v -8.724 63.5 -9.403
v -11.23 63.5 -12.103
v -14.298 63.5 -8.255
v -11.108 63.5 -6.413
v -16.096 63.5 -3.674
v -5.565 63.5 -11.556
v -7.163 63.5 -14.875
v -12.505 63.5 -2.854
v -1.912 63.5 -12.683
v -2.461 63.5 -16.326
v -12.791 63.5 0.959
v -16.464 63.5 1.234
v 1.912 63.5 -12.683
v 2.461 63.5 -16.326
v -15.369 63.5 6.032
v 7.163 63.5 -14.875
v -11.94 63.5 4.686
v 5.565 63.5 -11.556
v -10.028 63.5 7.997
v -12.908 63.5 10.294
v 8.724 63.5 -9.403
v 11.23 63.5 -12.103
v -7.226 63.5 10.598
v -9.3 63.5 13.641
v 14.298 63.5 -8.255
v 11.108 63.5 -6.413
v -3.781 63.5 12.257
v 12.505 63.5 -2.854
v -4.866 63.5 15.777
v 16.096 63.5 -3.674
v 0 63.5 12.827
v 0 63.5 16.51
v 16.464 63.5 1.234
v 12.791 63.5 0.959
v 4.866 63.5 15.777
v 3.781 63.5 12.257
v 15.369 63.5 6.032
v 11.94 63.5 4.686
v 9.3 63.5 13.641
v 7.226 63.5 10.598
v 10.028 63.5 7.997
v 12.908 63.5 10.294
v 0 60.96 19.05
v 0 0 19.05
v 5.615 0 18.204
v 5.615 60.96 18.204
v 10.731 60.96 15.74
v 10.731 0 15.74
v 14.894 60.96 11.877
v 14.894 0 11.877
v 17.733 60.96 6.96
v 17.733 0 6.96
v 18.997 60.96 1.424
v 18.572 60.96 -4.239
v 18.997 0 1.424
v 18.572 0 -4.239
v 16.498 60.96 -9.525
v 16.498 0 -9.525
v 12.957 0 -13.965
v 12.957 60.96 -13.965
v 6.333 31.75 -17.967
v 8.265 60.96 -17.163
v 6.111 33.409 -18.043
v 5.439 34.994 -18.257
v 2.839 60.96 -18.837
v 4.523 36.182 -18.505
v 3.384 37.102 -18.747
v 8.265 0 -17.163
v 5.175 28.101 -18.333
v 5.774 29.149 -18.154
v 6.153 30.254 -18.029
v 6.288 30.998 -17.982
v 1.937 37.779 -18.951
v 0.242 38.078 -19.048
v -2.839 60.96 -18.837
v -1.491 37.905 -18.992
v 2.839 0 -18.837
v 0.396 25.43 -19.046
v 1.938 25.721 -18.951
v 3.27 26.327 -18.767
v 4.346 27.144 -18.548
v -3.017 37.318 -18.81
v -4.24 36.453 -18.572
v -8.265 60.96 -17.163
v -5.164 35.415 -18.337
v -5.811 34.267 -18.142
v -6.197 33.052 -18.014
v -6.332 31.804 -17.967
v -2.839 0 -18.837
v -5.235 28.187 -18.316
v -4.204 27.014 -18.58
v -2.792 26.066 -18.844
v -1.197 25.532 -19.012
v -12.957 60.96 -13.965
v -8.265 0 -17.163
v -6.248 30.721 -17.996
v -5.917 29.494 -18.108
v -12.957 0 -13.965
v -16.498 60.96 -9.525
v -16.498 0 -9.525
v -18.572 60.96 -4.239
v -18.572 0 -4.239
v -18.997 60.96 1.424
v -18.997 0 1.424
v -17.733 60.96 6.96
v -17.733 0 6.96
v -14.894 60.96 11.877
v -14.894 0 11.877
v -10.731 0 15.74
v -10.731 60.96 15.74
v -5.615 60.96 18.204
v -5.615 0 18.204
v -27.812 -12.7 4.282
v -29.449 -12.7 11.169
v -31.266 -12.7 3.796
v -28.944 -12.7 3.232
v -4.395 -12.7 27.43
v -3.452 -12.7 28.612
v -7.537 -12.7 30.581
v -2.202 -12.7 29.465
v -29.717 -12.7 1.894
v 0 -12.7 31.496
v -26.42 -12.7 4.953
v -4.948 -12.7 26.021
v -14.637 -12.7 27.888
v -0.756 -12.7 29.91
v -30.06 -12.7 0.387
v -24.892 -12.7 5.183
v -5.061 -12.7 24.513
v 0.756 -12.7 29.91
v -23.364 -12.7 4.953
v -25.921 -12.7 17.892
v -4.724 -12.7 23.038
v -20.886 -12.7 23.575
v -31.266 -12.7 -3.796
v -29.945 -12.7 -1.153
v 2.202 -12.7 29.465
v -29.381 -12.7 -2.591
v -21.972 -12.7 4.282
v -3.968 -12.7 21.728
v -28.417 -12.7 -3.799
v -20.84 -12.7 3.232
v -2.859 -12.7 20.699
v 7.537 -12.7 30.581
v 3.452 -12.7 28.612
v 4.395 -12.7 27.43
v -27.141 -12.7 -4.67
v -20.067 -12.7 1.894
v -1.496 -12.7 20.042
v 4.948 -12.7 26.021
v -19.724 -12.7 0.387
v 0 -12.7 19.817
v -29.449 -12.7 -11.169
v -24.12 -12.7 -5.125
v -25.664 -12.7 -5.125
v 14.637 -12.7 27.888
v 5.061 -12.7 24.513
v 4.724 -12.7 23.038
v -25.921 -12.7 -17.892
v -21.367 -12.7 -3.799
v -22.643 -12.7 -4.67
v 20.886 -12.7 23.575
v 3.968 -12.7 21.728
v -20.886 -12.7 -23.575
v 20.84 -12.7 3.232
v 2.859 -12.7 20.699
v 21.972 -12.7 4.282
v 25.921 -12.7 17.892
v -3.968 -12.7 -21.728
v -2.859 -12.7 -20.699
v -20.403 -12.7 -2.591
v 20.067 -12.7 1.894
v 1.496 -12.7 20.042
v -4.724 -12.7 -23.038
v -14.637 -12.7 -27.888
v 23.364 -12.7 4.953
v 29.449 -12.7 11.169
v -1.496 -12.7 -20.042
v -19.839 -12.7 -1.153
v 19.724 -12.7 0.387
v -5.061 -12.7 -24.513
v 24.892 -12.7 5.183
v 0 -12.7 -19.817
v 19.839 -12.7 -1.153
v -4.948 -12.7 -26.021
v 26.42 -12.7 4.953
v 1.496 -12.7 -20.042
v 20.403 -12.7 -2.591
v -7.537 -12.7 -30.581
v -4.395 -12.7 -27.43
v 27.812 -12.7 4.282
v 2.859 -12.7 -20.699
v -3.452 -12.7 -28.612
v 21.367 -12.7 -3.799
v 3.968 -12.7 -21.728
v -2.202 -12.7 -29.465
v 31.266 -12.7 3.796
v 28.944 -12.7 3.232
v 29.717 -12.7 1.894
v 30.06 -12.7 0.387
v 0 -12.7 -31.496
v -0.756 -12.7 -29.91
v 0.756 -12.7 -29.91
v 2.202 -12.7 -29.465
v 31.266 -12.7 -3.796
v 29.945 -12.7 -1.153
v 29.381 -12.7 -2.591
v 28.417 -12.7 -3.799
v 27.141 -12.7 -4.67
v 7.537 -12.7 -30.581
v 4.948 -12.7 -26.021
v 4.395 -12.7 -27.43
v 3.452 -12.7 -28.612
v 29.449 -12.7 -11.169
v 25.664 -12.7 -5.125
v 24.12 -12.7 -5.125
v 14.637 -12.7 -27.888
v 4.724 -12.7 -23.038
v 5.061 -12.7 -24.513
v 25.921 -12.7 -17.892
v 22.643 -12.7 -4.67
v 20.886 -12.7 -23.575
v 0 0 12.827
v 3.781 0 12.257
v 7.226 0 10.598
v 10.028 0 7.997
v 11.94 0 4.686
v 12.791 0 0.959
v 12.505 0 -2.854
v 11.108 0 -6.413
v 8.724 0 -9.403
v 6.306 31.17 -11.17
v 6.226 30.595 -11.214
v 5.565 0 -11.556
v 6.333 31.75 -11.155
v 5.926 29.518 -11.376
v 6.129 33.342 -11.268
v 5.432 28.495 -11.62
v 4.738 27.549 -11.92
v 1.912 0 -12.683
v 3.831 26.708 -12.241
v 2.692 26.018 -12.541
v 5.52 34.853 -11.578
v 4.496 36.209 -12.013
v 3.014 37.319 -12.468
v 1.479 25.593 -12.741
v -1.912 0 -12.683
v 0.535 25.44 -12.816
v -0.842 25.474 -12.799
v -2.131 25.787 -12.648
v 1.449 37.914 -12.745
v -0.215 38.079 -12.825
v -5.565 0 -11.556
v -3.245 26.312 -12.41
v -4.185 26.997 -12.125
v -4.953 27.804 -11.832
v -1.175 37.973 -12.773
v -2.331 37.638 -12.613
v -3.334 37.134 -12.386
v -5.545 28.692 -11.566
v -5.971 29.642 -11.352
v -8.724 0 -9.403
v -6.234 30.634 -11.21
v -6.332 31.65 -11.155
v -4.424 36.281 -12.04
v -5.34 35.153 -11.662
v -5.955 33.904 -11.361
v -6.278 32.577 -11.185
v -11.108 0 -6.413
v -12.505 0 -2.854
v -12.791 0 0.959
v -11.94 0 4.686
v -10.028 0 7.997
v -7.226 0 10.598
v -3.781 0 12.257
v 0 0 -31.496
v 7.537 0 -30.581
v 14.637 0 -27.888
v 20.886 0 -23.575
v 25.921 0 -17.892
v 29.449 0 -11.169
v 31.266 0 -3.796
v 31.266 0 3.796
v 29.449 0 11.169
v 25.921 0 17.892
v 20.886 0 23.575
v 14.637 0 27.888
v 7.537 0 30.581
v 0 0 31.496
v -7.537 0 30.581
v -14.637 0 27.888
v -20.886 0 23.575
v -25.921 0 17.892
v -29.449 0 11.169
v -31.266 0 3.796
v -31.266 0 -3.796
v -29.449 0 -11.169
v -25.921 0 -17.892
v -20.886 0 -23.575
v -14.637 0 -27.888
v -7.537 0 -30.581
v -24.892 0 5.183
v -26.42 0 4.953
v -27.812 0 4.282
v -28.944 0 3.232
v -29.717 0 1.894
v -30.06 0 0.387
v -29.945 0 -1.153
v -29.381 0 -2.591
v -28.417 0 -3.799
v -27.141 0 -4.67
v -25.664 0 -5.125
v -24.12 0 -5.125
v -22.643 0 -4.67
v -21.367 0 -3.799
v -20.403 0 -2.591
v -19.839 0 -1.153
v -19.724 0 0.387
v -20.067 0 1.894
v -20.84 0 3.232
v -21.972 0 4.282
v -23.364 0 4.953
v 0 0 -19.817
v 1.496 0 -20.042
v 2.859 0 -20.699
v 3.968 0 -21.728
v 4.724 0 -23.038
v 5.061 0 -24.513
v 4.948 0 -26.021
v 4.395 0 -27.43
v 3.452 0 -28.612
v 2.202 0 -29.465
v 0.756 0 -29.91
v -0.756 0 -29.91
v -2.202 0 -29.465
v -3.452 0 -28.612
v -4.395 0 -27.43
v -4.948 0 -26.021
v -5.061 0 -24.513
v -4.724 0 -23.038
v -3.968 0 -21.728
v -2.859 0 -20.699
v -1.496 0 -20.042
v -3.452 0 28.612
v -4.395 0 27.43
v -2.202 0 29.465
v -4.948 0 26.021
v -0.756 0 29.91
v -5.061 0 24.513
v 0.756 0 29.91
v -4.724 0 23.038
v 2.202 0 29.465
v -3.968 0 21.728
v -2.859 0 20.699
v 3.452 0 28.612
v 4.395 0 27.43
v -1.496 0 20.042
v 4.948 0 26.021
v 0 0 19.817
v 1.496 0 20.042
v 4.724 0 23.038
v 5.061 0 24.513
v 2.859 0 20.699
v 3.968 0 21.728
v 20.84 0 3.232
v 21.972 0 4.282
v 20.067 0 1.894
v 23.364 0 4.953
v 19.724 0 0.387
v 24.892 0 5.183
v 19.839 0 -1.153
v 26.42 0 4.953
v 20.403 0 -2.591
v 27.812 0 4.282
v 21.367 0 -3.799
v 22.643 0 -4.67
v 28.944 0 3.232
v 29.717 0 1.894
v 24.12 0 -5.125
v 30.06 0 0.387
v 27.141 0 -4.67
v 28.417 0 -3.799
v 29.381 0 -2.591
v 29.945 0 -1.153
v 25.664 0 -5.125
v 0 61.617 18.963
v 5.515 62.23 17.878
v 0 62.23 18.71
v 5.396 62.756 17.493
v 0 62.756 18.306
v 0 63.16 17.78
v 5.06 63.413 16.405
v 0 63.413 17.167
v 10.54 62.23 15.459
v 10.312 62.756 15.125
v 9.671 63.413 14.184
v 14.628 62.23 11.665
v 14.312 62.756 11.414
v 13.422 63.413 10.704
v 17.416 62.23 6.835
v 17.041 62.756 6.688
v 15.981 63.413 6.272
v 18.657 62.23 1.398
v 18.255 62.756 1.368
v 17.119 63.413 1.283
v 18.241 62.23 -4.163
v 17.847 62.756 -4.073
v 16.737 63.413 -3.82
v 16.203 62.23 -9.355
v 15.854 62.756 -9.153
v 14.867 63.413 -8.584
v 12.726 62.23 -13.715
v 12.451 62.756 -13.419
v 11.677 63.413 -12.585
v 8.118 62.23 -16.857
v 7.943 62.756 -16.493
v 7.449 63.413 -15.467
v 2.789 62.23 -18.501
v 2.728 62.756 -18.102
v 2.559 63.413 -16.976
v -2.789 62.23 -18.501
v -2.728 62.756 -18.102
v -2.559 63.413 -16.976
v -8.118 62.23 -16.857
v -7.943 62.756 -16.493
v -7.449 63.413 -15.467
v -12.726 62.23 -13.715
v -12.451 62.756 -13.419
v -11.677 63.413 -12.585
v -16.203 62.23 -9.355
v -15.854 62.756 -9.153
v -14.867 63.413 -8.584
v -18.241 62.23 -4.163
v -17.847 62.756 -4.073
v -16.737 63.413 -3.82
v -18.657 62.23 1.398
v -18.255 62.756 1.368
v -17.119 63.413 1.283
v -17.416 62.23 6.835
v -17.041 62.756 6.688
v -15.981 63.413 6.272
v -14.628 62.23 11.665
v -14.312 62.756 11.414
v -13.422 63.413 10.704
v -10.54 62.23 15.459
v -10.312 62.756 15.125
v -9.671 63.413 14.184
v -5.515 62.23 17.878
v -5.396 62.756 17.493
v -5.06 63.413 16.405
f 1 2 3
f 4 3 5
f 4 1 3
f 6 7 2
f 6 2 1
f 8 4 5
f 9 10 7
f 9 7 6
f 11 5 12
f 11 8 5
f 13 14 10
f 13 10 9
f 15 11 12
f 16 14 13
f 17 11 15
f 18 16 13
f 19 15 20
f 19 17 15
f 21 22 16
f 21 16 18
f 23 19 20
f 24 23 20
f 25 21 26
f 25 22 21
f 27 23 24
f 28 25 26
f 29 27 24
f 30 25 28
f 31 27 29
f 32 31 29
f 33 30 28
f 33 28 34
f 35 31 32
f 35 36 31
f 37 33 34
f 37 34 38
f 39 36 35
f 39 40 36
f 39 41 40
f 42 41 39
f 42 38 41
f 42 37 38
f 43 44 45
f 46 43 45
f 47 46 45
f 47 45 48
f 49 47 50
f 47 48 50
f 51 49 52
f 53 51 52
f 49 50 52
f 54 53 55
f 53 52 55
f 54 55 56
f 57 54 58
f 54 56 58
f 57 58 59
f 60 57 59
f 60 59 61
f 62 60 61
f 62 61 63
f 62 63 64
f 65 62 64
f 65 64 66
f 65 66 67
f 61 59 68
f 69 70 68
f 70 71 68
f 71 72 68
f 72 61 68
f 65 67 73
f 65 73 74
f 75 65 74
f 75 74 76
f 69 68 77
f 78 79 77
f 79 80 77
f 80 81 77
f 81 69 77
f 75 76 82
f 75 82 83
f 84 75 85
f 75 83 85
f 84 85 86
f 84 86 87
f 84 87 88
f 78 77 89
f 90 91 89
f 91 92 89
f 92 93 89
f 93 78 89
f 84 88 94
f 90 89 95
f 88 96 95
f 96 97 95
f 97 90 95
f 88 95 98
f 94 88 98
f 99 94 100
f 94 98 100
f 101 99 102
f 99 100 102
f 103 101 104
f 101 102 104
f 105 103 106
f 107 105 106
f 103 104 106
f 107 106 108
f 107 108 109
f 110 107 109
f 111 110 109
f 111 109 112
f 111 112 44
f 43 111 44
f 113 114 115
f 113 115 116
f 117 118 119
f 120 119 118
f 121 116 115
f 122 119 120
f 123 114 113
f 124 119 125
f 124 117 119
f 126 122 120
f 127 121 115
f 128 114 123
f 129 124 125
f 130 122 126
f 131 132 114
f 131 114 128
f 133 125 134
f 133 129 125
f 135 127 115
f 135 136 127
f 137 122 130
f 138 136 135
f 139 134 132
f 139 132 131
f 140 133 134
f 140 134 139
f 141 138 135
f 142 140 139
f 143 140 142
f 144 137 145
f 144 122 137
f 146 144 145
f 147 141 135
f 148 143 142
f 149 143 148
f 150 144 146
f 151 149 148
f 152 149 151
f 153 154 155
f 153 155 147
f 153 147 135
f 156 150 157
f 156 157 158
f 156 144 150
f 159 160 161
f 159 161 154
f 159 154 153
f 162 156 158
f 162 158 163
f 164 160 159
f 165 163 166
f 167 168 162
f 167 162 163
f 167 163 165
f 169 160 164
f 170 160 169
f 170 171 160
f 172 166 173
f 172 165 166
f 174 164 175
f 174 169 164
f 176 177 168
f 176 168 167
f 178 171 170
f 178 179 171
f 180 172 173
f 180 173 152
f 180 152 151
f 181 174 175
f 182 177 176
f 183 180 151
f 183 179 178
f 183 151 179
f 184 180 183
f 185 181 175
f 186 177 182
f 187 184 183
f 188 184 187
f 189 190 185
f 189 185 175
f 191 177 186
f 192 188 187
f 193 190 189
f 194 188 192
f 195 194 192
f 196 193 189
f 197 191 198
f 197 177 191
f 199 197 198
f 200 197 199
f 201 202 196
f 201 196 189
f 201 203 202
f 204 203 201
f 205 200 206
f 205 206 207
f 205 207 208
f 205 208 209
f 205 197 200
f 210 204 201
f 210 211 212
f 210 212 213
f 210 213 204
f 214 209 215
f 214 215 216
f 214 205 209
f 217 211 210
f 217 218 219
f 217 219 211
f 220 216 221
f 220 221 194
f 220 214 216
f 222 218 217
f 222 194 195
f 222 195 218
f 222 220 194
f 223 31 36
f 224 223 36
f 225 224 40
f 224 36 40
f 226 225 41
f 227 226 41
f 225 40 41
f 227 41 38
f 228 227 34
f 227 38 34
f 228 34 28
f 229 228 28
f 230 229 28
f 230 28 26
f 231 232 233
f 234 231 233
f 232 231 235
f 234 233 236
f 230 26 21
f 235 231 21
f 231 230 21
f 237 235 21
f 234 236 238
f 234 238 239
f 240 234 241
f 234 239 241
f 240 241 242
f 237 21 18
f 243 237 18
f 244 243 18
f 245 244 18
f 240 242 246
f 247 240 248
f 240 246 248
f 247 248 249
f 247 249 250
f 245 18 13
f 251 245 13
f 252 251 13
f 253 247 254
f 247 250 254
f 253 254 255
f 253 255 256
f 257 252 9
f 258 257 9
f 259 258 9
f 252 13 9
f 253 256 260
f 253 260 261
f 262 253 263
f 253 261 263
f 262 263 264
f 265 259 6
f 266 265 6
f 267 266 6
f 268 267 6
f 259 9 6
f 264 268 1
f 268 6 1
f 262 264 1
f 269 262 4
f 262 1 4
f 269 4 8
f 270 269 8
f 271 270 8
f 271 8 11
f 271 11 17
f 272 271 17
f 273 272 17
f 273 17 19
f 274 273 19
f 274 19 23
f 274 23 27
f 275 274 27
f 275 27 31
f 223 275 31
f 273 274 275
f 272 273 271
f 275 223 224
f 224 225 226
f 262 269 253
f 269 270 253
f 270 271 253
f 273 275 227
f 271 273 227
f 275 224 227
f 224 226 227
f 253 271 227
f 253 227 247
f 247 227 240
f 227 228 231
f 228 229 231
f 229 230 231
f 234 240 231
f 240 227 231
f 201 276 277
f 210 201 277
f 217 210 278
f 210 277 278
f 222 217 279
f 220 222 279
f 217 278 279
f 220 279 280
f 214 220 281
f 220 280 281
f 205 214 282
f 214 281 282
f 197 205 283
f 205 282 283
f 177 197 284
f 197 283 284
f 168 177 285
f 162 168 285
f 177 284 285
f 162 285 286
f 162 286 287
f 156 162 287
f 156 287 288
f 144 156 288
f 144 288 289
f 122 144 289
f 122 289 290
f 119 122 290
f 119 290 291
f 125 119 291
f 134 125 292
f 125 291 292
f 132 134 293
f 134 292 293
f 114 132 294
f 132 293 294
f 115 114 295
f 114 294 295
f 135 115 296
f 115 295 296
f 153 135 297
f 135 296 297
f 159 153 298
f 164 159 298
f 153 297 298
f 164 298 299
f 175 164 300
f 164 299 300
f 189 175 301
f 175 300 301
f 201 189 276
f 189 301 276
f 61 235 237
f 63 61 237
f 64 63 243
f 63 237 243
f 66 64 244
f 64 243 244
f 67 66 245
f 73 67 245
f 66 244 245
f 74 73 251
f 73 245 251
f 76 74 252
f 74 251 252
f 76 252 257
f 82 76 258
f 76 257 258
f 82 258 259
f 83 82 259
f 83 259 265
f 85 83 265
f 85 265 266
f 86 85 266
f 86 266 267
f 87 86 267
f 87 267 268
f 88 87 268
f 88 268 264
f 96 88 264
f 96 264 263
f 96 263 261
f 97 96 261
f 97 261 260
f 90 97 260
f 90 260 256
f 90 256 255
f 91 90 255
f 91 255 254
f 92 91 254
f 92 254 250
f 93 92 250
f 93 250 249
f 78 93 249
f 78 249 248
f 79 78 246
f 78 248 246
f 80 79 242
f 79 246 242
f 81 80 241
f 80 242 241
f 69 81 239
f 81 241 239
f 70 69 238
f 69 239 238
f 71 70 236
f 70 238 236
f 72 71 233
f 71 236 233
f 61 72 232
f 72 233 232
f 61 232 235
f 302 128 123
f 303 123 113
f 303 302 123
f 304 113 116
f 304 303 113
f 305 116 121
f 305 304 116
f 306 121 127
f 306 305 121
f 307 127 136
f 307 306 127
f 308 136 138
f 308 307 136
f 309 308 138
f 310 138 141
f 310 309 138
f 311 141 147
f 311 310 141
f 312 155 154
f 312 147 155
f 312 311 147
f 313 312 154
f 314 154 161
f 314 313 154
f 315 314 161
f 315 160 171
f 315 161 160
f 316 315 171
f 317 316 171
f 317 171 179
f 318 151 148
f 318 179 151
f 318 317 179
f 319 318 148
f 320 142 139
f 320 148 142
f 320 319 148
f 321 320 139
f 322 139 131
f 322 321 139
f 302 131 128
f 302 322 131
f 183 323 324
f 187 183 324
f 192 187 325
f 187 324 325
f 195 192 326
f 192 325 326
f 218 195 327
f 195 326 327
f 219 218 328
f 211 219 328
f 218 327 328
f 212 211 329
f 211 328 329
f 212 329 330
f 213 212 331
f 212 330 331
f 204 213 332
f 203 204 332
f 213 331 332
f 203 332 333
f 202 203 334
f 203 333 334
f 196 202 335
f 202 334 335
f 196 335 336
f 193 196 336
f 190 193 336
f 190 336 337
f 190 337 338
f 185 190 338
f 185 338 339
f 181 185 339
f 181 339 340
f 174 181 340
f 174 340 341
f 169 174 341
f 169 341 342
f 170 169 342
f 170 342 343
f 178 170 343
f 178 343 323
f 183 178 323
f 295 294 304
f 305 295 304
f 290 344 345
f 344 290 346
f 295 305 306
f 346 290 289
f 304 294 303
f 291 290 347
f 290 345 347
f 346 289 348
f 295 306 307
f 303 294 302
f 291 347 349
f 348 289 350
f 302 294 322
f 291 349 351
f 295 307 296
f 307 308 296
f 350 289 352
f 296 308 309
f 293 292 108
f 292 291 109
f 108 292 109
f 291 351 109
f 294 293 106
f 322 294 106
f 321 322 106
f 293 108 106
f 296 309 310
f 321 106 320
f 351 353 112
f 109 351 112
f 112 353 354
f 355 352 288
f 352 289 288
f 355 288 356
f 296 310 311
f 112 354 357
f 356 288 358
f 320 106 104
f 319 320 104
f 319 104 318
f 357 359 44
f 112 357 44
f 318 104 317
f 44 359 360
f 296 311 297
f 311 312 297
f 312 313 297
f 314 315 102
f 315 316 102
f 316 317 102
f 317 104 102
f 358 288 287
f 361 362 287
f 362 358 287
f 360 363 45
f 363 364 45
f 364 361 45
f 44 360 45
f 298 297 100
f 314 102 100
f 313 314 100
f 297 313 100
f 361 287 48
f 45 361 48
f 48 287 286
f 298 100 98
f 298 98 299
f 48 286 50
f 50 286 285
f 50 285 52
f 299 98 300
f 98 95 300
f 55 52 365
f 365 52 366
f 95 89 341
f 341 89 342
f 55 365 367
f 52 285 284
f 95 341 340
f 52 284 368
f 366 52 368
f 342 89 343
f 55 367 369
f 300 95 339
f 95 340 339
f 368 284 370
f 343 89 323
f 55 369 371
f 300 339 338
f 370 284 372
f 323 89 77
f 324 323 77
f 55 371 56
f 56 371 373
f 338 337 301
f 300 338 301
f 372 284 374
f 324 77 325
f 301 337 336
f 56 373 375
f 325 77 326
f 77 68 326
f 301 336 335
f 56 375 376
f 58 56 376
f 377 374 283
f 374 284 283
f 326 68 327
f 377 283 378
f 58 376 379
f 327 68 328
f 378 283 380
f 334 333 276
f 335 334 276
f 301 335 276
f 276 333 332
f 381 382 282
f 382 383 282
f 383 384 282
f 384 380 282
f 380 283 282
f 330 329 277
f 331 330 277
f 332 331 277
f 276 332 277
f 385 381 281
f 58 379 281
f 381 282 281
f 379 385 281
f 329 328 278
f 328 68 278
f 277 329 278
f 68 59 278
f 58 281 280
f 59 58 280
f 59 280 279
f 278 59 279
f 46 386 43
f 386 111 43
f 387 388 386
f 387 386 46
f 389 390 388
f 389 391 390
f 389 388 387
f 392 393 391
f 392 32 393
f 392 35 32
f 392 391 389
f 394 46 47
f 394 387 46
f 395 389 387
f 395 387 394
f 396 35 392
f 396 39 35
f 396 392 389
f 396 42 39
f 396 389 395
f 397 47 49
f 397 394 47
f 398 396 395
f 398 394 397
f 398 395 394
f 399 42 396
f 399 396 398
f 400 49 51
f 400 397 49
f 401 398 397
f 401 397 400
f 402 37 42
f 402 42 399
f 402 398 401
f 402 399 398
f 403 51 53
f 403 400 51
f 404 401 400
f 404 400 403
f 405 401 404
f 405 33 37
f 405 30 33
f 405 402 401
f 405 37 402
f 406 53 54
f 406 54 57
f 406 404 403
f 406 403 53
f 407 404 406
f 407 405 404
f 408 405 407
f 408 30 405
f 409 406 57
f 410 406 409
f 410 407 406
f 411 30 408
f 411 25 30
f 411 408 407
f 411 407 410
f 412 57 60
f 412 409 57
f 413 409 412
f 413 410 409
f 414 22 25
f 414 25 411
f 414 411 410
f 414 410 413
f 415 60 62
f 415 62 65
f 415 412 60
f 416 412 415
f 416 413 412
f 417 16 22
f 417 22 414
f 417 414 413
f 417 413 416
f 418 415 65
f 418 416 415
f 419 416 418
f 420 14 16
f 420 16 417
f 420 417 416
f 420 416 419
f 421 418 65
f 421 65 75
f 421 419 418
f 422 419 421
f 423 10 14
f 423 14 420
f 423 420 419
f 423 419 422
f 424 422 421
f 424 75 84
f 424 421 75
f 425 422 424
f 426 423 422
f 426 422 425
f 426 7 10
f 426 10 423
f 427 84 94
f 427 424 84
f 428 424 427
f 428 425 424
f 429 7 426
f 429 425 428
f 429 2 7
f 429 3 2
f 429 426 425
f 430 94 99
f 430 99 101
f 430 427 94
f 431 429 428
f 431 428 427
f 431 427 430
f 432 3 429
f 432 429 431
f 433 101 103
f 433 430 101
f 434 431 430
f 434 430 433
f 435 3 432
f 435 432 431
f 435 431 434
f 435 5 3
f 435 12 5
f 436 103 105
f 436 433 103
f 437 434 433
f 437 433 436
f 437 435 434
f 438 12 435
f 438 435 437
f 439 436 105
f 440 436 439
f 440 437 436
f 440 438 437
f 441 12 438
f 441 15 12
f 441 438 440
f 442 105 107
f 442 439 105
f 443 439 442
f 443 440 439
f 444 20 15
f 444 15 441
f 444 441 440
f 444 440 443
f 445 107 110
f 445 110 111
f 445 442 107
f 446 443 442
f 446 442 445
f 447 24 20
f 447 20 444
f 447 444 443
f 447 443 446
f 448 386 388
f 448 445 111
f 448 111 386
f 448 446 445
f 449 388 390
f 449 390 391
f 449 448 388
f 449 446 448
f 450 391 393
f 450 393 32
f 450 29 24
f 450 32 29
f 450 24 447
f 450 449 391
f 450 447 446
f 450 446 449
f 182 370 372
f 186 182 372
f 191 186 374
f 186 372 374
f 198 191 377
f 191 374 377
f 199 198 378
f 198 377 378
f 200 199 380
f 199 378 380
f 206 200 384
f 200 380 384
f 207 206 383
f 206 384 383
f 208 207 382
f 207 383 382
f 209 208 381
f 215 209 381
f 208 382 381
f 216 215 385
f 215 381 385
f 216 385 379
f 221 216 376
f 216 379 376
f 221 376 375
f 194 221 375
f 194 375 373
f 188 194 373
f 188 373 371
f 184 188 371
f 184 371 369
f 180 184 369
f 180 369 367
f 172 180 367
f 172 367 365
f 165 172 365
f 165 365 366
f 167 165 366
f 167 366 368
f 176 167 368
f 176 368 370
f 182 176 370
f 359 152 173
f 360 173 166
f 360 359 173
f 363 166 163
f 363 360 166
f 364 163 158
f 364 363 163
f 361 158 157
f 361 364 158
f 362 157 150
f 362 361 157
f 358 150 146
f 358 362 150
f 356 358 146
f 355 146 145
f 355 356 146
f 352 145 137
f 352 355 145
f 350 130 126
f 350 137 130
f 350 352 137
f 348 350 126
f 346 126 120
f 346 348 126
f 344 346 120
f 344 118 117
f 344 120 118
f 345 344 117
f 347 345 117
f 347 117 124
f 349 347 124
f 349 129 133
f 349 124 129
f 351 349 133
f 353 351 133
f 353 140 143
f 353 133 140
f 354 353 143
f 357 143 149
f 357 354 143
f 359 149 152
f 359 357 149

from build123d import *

# Parameters (mm, degrees)
SKETCH1_R                                  = 19.05
BOSS_EXTRUDE1_DEPTH                        = 63.5
SKETCH2_R                                  = 12.826740919
CUT_EXTRUDE1_DEPTH                         = 69.978656119
SKETCH3_R                                  = 6.33257482
CUT_EXTRUDE2_DEPTH                         = 69.978656119
FILLET1_R                                  = 2.54
SKETCH4_R                                  = 31.496
BOSS_EXTRUDE3_DEPTH                        = 12.7
SKETCH5_R                                  = 5.075123318
CUT_EXTRUDE3_DEPTH                         = 78.564463801
MIRROR1_AT_THE_SECOND_PLANE_COPY_1_SKETC_R = 5.075123318
MIRROR1_AT_THE_SECOND_PLANE_COPY_1_DEPTH   = 78.564463801
SKETCH6_R                                  = 5.182943359
CUT_EXTRUDE4_DEPTH                         = 78.564463801
MIRROR2_AT_THE_SECOND_PLANE_COPY_1_SKETC_R = 5.182943359
MIRROR2_AT_THE_SECOND_PLANE_COPY_1_DEPTH   = 78.564463801


with BuildPart() as part:
    # Sketch1 → Boss-Extrude1 (new body)
    with BuildSketch(Plane(origin=(0, 0, 0), x_dir=(1, 0, 0), z_dir=(0, 1, 0))):
        with Locations(Location((0, 0, 0), (0, 0, 270))):
            Circle(SKETCH1_R)
    extrude(amount=BOSS_EXTRUDE1_DEPTH)

    # Sketch2 → Cut-Extrude1 (cut, through all)
    with BuildSketch(Plane(origin=(0, 63.5, 0), x_dir=(1, 0, 0), z_dir=(0, 1, 0))):
        with Locations(Location((0, 0, 0), (0, 0, 270))):
            Circle(SKETCH2_R)
    extrude(amount=-CUT_EXTRUDE1_DEPTH, mode=Mode.SUBTRACT)

    # Sketch3 → Cut-Extrude2 (cut, through all)
    with BuildSketch(Plane.XY):
        with Locations((0, 31.75)):
            Circle(SKETCH3_R)
    extrude(amount=-CUT_EXTRUDE2_DEPTH, mode=Mode.SUBTRACT)

    # Fillet1
    fillet1_edges = [part.edges().sort_by_distance(p)[0] for p in [
        (0, 63.5, -19.05),
    ]]
    fillet(fillet1_edges, radius=FILLET1_R)

    # Sketch4 → Boss-Extrude3 (add)
    with BuildSketch(Plane.XZ):
        with Locations(Location((0, 0, 0), (0, 0, 270))):
            Circle(SKETCH4_R)
    extrude(amount=BOSS_EXTRUDE3_DEPTH)

    # Sketch5 → Cut-Extrude3 (cut, through all)
    with BuildSketch(Plane(origin=(0, 0, 0), x_dir=(1, 0, 0), z_dir=(0, 1, 0))):
        with Locations(Location((0, 24.892, 0), (0, 0, 270))):
            Circle(SKETCH5_R)
    cut_extrude3 = extrude(amount=-CUT_EXTRUDE3_DEPTH, mode=Mode.SUBTRACT)

    # Mirror1: Cut-Extrude3 across plane
    add(cut_extrude3.mirror(Plane(origin=(0, 0, 0), x_dir=(0, 0, 1), z_dir=(1, 0, 0))), mode=Mode.SUBTRACT)

    # Mirror1 at the second plane: Cut-Extrude3 across plane
    add(cut_extrude3.mirror(Plane.XY), mode=Mode.SUBTRACT)

    # Mirror1 at the second plane copy 1 sketc → Mirror1 at the second plane copy 1 (cut, through all)
    with BuildSketch(Plane(origin=(0, 0, 0), x_dir=(-1, 0, 0), z_dir=(0, 1, 0))):
        with Locations(Location((0, 24.892, 0), (0, 0, 270))):
            Circle(MIRROR1_AT_THE_SECOND_PLANE_COPY_1_SKETC_R)
    extrude(amount=-MIRROR1_AT_THE_SECOND_PLANE_COPY_1_DEPTH, mode=Mode.SUBTRACT)

    # Sketch6 → Cut-Extrude4 (cut, through all)
    with BuildSketch(Plane(origin=(0, 0, 0), x_dir=(1, 0, 0), z_dir=(0, 1, 0))):
        with Locations(Location((24.892, 0, 0), (0, 0, 270))):
            Circle(SKETCH6_R)
    cut_extrude4 = extrude(amount=-CUT_EXTRUDE4_DEPTH, mode=Mode.SUBTRACT)

    # Mirror2: Cut-Extrude4 across plane
    add(cut_extrude4.mirror(Plane.XY), mode=Mode.SUBTRACT)

    # Mirror2 at the second plane: Cut-Extrude4 across plane
    add(cut_extrude4.mirror(Plane(origin=(0, 0, 0), x_dir=(0, 0, 1), z_dir=(1, 0, 0))), mode=Mode.SUBTRACT)

    # Mirror2 at the second plane copy 1 sketc → Mirror2 at the second plane copy 1 (cut, through all)
    with BuildSketch(Plane(origin=(0, 0, 0), x_dir=(-1, 0, 0), z_dir=(0, 1, 0))):
        with Locations(Location((24.892, 0, 0), (0, 0, 270))):
            Circle(MIRROR2_AT_THE_SECOND_PLANE_COPY_1_SKETC_R)
    extrude(amount=-MIRROR2_AT_THE_SECOND_PLANE_COPY_1_DEPTH, mode=Mode.SUBTRACT)


solid = part.part
